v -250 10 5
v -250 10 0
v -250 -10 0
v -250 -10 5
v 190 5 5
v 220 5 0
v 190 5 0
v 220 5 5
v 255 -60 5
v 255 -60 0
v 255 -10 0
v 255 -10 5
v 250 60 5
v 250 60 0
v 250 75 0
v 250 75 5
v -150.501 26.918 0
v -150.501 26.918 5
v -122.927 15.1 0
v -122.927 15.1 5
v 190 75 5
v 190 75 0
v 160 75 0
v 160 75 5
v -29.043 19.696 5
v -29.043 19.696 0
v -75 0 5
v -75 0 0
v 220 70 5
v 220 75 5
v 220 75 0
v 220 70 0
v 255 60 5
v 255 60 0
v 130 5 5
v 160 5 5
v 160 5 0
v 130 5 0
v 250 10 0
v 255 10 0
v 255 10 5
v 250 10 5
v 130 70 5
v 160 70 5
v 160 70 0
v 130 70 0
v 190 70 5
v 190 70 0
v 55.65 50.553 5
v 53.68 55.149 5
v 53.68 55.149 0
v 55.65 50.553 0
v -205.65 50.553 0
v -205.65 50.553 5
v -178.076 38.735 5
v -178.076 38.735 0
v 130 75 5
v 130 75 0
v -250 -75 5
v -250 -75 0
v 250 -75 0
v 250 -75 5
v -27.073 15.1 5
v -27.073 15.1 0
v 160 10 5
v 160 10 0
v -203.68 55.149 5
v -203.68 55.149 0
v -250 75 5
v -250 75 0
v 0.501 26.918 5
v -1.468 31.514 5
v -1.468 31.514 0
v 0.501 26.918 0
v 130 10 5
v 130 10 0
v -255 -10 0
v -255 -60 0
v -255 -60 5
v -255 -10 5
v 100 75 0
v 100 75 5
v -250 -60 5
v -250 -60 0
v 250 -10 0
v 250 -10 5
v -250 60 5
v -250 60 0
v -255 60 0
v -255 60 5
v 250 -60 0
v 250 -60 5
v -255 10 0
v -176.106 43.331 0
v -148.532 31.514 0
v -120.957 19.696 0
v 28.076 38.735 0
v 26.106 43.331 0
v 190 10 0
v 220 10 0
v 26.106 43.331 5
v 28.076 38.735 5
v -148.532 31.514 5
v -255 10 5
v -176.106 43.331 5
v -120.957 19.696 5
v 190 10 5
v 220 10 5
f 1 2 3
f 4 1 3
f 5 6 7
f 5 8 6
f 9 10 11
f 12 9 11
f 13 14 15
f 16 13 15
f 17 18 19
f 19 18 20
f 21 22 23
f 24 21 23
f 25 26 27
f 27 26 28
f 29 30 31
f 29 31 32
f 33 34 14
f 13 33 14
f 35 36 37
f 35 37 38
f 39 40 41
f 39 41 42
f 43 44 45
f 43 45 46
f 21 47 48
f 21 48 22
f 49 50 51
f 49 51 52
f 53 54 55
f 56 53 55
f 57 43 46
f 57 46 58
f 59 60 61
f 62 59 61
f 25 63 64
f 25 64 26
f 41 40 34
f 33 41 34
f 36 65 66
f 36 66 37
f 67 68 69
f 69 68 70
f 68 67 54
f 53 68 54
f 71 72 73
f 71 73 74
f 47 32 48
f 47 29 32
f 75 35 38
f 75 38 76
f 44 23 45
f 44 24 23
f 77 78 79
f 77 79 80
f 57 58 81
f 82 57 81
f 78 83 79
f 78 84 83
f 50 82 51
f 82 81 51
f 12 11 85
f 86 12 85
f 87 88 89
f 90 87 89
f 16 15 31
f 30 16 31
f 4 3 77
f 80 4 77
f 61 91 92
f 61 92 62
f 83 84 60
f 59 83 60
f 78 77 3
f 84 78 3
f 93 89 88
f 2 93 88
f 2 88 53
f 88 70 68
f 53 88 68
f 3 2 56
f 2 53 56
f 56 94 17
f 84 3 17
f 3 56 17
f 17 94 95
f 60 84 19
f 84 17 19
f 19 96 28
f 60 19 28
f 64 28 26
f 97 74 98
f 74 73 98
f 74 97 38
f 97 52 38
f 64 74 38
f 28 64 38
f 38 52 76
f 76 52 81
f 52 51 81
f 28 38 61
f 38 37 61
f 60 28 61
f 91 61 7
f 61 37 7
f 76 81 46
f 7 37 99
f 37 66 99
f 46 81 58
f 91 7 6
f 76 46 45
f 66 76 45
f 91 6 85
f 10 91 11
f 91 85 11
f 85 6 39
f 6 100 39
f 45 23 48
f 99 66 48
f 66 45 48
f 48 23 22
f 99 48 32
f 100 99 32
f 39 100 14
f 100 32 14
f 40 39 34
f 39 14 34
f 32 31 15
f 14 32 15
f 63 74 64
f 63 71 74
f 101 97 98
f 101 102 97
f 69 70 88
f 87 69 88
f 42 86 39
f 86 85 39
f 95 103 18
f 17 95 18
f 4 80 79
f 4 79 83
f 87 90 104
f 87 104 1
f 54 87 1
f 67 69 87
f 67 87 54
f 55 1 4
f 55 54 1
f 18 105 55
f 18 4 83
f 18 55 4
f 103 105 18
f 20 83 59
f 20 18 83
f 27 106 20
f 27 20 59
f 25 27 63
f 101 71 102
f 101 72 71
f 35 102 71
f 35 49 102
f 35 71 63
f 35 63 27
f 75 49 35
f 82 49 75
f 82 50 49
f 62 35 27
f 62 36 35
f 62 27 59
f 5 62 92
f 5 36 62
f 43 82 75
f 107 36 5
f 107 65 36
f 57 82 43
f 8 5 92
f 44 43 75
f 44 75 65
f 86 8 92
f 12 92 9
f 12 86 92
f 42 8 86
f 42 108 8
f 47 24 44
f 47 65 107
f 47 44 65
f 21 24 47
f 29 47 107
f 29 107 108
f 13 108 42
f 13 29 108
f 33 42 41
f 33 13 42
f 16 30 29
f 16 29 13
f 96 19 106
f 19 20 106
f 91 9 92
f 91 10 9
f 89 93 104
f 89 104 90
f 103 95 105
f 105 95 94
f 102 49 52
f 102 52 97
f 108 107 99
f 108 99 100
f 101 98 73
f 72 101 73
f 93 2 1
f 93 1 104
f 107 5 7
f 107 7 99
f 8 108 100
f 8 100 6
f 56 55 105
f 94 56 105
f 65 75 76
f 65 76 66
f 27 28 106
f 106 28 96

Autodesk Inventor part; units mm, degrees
ref_plane "YZ Plane" through (0, 0, 0) normal (1, 0, 0) x (0, 1, 0)
ref_plane "XZ Plane" through (0, 0, 0) normal (0, 1, 0) x (-1, 0, 0)
ref_plane "XY Plane" through (0, 0, 0) normal (0, 0, 1) x (1, 0, 0)
ref_plane "Work Plane1" through (-2241.136, -81.6179, 0) normal (0, 0, 1) x (1, 0, 0)
sketch "Sketch1" plane through (-2241.136, -81.6179, 0) normal (0, 0, 1) x (1, 0, 0)
  line L0 (2006.136, 61.2134) -> (2006.136, 6.6179) projected
  line L1 (2006.136, 6.6179) -> (2476.136, 6.6179) projected
  line L2 (2476.136, 6.6179) -> (2476.136, 61.2134) projected
  line L3 (2476.136, 61.2134) -> (2491.136, 61.2134) projected
  line L4 (2491.136, 61.2134) -> (2491.136, 156.6179) projected
  line L5 (2491.136, 156.6179) -> (2341.136, 156.6179) projected
  line L6 (2341.136, 156.6179) -> (2166.136, 81.6179) projected
  line L7 (2166.136, 81.6179) -> (1991.136, 156.6179) projected
  line L8 (1991.136, 156.6179) -> (1991.136, 61.2134) projected
  line L9 (1991.136, 61.2134) -> (2006.136, 61.2134) projected
  line L10 (1991.136, 91.6179) -> (1991.136, 141.6179) projected
  line L11 (1991.136, 141.6179) -> (1986.136, 141.6179) projected
  line L12 (1986.136, 91.6179) -> (1986.136, 141.6179) projected
  line L13 (1991.136, 91.6179) -> (1986.136, 91.6179) projected
  line L14 (1991.136, 21.6179) -> (1991.136, 71.6179) projected
  line L15 (1991.136, 71.6179) -> (1986.136, 71.6179) projected
  line L16 (1986.136, 21.6179) -> (1986.136, 71.6179) projected
  line L17 (1991.136, 21.6179) -> (1986.136, 21.6179) projected
  line L18 (1986.136, 91.6179) -> (1991.136, 91.6179)
  line L19 (1991.136, 91.6179) -> (1991.136, 71.6179)
  line L20 (1991.136, 71.6179) -> (1986.136, 71.6179)
  line L21 (1986.136, 71.6179) -> (1986.136, 91.6179)
  line L22 (1991.136, 156.6179) -> (1986.136, 156.6179)
  line L23 (1986.136, 156.6179) -> (1986.136, 141.6179)
  line L24 (1986.136, 141.6179) -> (1991.136, 141.6179)
  line L25 (1991.136, 141.6179) -> (1991.136, 156.6179)
  line L26 (1986.136, 21.6179) -> (1991.136, 21.6179)
  line L27 (1991.136, 21.6179) -> (1991.136, 6.6179)
  line L28 (1991.136, 6.6179) -> (1986.136, 6.6179)
  line L29 (1986.136, 6.6179) -> (1986.136, 21.6179)
  line L30 (2006.136, 6.6179) -> (1991.136, 6.6179)
  line L31 (1991.136, 6.6179) -> (1991.136, 61.2134)
  line L32 (1991.136, 61.2134) -> (2006.136, 61.2134)
  line L33 (2006.136, 61.2134) -> (2006.136, 6.6179)
  line L34 (2496.136, 91.6179) -> (2496.136, 141.6179) projected
  line L35 (2496.136, 141.6179) -> (2491.136, 141.6179) projected
  line L36 (2491.136, 91.6179) -> (2491.136, 141.6179) projected
  line L37 (2496.136, 91.6179) -> (2491.136, 91.6179) projected
  line L38 (2496.136, 21.6179) -> (2496.136, 71.6179) projected
  line L39 (2496.136, 71.6179) -> (2491.136, 71.6179) projected
  line L40 (2491.136, 21.6179) -> (2491.136, 71.6179) projected
  line L41 (2496.136, 21.6179) -> (2491.136, 21.6179) projected
  line L42 (2491.136, 6.6179) -> (2476.136, 6.6179)
  line L43 (2476.136, 6.6179) -> (2476.136, 61.2134)
  line L44 (2476.136, 61.2134) -> (2491.136, 61.2134)
  line L45 (2491.136, 61.2134) -> (2491.136, 6.6179)
  point P0 (2241.136, 81.6179)
  point P1 (1991.136, 6.6179)
  point P2 (820.3787, 21.6179)
  point P3 (1320.3787, 21.6179)
  point P4 (820.3787, 20.4045)
  point P5 (1905.7573, 6.6179)
  point P6 (1305.3787, -34.1911)
  point P7 (820.3787, 21.6179)
  point P8 (2476.136, 6.6179)
extrude "Extrusion1" add sketch "Sketch1" along normal blind 5 contours L9 L8 L7 L6 L5 L4 L3 L2 L1 L0 | L0 L30 L27 L14 L9 | L14 L17 L16 L15 L8 | L2 L3 L40 L45 L42 | L13 L12 L11 L8 | L4 L39 L38 L41 L40 | L4 L35 L34 L37
sketch "Sketch2" plane through (-2241.136, -81.6179, 5) normal (0, 0, 1) x (1, 0, 0)
  line L0 (1991.136, 6.6179) -> (2491.136, 6.6179) projected
  line L1 (2491.136, 6.6179) -> (2491.136, 21.6179) projected
  line L2 (2491.136, 21.6179) -> (2496.136, 21.6179) projected
  line L3 (2496.136, 21.6179) -> (2496.136, 71.6179) projected
  line L4 (2496.136, 71.6179) -> (2491.136, 71.6179) projected
  line L5 (2491.136, 71.6179) -> (2491.136, 91.6179) projected
  line L6 (2491.136, 91.6179) -> (2496.136, 91.6179) projected
  line L7 (2496.136, 91.6179) -> (2496.136, 141.6179) projected
  line L8 (2496.136, 141.6179) -> (2491.136, 141.6179) projected
  line L9 (2491.136, 141.6179) -> (2491.136, 156.6179) projected
  line L10 (2491.136, 156.6179) -> (2341.136, 156.6179) projected
  line L11 (2341.136, 156.6179) -> (2166.136, 81.6179) projected
  line L12 (2166.136, 81.6179) -> (1991.136, 156.6179) projected
  line L13 (1991.136, 156.6179) -> (1991.136, 141.6179) projected
  line L14 (1991.136, 141.6179) -> (1986.136, 141.6179) projected
  line L15 (1986.136, 141.6179) -> (1986.136, 91.6179) projected
  line L16 (1986.136, 91.6179) -> (1991.136, 91.6179) projected
  line L17 (1991.136, 91.6179) -> (1991.136, 71.6179) projected
  line L18 (1991.136, 71.6179) -> (1986.136, 71.6179) projected
  line L19 (1986.136, 71.6179) -> (1986.136, 21.6179) projected
  line L20 (1986.136, 21.6179) -> (1991.136, 21.6179) projected
  line L21 (1991.136, 21.6179) -> (1991.136, 6.6179) projected
  line L22 (2371.136, 156.6179) -> (2401.136, 156.6179)
  line L23 (2401.136, 156.6179) -> (2401.136, 151.6179)
  line L24 (2401.136, 151.6179) -> (2371.136, 151.6179)
  line L25 (2371.136, 151.6179) -> (2371.136, 156.6179)
  line L26 (2431.136, 156.6179) -> (2461.136, 156.6179)
  line L27 (2461.136, 156.6179) -> (2461.136, 151.6179)
  line L28 (2461.136, 151.6179) -> (2431.136, 151.6179)
  line L29 (2431.136, 151.6179) -> (2431.136, 156.6179)
  line L30 (2166.136, 81.6179) -> (1991.136, 156.6179) projected
  line L31 (2037.4557, 136.7666) -> (2035.4861, 132.1708)
  line L32 (2035.4861, 132.1708) -> (2063.0604, 120.3533)
  line L33 (2063.0604, 120.3533) -> (2065.03, 124.949)
  line L34 (2092.6044, 113.1314) -> (2090.6348, 108.5357)
  line L35 (2090.6348, 108.5357) -> (2118.2091, 96.7181)
  line L36 (2118.2091, 96.7181) -> (2120.1787, 101.3138)
  line L37 (2166.136, 81.6179) -> (2166.136, 154.1179)
  line L38 (2294.8163, 136.7666) -> (2296.7859, 132.1708)
  line L39 (2296.7859, 132.1708) -> (2269.2115, 120.3533)
  line L40 (2269.2115, 120.3533) -> (2267.2419, 124.949)
  line L41 (2239.6676, 113.1314) -> (2241.6372, 108.5357)
  line L42 (2241.6372, 108.5357) -> (2214.0628, 96.7181)
  line L43 (2214.0628, 96.7181) -> (2212.0932, 101.3138)
  point P0 (2241.136, 81.6179)
  point P1 (2294.8163, 136.7666)
  point P2 (2267.2419, 124.949)
  point P3 (2239.6676, 113.1314)
  point P4 (2092.6044, 113.1314)
  point P5 (2037.4557, 136.7666)
  dimension "d2" = 30
  dimension "d3" = 5
  dimension "d4" = 30
  dimension "d5" = 5
  dimension "d6" = 30
  dimension "d7" = 30
  dimension "d10" = 30
  dimension "d11" = 5
  dimension "d12" = 30
  dimension "d13" = 5
  dimension "d14" = 30
  dimension "d15" = 50
extrude "Extrusion2" cut sketch "Sketch2" against normal blind 5 contours L12 L33 L32 L31 | L27 L28 L29 L10 | L12 L36 L35 L34 | L23 L24 L25 L10 | L11 L41 L42 L43 | L38 L39 L40 L11
sketch "Sketch3" plane through (-2241.136, -81.6179, 5) normal (0, 0, 1) x (1, 0, 0)
  point P0 (2241.136, 81.6179)
sketch "Sketch4" plane through (-2241.136, -81.6179, 5) normal (0, 0, 1) x (1, 0, 0)
  line L0 (2371.136, 91.6179) -> (2401.136, 91.6179)
  line L1 (2401.136, 91.6179) -> (2401.136, 86.6179)
  line L2 (2401.136, 86.6179) -> (2371.136, 86.6179)
  line L3 (2371.136, 86.6179) -> (2371.136, 91.6179)
  line L4 (2214.0628, 96.7181) -> (2212.0932, 101.3138) projected
  line L5 (2212.0932, 101.3138) -> (2166.136, 81.6179) projected
  line L6 (2166.136, 81.6179) -> (2120.1787, 101.3138) projected
  line L7 (2120.1787, 101.3138) -> (2118.2091, 96.7181) projected
  line L8 (2118.2091, 96.7181) -> (2090.6348, 108.5357) projected
  line L9 (2090.6348, 108.5357) -> (2092.6044, 113.1314) projected
  line L10 (2092.6044, 113.1314) -> (2065.03, 124.949) projected
  line L11 (2065.03, 124.949) -> (2063.0604, 120.3533) projected
  line L12 (2063.0604, 120.3533) -> (2035.4861, 132.1708) projected
  line L13 (2035.4861, 132.1708) -> (2037.4557, 136.7666) projected
  line L14 (2037.4557, 136.7666) -> (1991.136, 156.6179) projected
  line L15 (1991.136, 156.6179) -> (1991.136, 141.6179) projected
  line L16 (1991.136, 141.6179) -> (1986.136, 141.6179) projected
  line L17 (1986.136, 141.6179) -> (1986.136, 91.6179) projected
  line L18 (1986.136, 91.6179) -> (1991.136, 91.6179) projected
  line L19 (1991.136, 91.6179) -> (1991.136, 71.6179) projected
  line L20 (1991.136, 71.6179) -> (1986.136, 71.6179) projected
  line L21 (1986.136, 71.6179) -> (1986.136, 21.6179) projected
  line L22 (1986.136, 21.6179) -> (1991.136, 21.6179) projected
  line L23 (1991.136, 21.6179) -> (1991.136, 6.6179) projected
  line L24 (1991.136, 6.6179) -> (2491.136, 6.6179) projected
  line L25 (2491.136, 6.6179) -> (2491.136, 21.6179) projected
  line L26 (2491.136, 21.6179) -> (2496.136, 21.6179) projected
  line L27 (2496.136, 21.6179) -> (2496.136, 71.6179) projected
  line L28 (2496.136, 71.6179) -> (2491.136, 71.6179) projected
  line L29 (2491.136, 71.6179) -> (2491.136, 91.6179) projected
  line L30 (2491.136, 91.6179) -> (2496.136, 91.6179) projected
  line L31 (2496.136, 91.6179) -> (2496.136, 141.6179) projected
  line L32 (2496.136, 141.6179) -> (2491.136, 141.6179) projected
  line L33 (2491.136, 141.6179) -> (2491.136, 156.6179) projected
  line L34 (2491.136, 156.6179) -> (2461.136, 156.6179) projected
  line L35 (2461.136, 156.6179) -> (2461.136, 151.6179) projected
  line L36 (2461.136, 151.6179) -> (2431.136, 151.6179) projected
  line L37 (2431.136, 151.6179) -> (2431.136, 156.6179) projected
  line L38 (2431.136, 156.6179) -> (2401.136, 156.6179) projected
  line L39 (2401.136, 156.6179) -> (2401.136, 151.6179) projected
  line L40 (2401.136, 151.6179) -> (2371.136, 151.6179) projected
  line L41 (2371.136, 151.6179) -> (2371.136, 156.6179) projected
  line L42 (2371.136, 156.6179) -> (2341.136, 156.6179) projected
  line L43 (2341.136, 156.6179) -> (2294.8163, 136.7666) projected
  line L44 (2294.8163, 136.7666) -> (2296.7859, 132.1708) projected
  line L45 (2296.7859, 132.1708) -> (2269.2115, 120.3533) projected
  line L46 (2269.2115, 120.3533) -> (2267.2419, 124.949) projected
  line L47 (2267.2419, 124.949) -> (2239.6676, 113.1314) projected
  line L48 (2239.6676, 113.1314) -> (2241.6372, 108.5357) projected
  line L49 (2241.6372, 108.5357) -> (2214.0628, 96.7181) projected
  line L50 (2431.136, 91.6179) -> (2461.136, 91.6179)
  line L51 (2461.136, 91.6179) -> (2461.136, 86.6179)
  line L52 (2461.136, 86.6179) -> (2431.136, 86.6179)
  line L53 (2431.136, 86.6179) -> (2431.136, 91.6179)
  point P0 (2241.136, 81.6179)
  dimension "d16" = 30
  dimension "d17" = 5
  dimension "d18" = 80
  dimension "d19" = 30
  dimension "d20" = 5
  dimension "d21" = 30
  dimension "d22" = 30
extrude "Extrusion3" cut sketch "Sketch4" against normal blind 5 contours L0 L1 L2 L3 | L50 L51 L52 L53
properties part number "Frontal"
